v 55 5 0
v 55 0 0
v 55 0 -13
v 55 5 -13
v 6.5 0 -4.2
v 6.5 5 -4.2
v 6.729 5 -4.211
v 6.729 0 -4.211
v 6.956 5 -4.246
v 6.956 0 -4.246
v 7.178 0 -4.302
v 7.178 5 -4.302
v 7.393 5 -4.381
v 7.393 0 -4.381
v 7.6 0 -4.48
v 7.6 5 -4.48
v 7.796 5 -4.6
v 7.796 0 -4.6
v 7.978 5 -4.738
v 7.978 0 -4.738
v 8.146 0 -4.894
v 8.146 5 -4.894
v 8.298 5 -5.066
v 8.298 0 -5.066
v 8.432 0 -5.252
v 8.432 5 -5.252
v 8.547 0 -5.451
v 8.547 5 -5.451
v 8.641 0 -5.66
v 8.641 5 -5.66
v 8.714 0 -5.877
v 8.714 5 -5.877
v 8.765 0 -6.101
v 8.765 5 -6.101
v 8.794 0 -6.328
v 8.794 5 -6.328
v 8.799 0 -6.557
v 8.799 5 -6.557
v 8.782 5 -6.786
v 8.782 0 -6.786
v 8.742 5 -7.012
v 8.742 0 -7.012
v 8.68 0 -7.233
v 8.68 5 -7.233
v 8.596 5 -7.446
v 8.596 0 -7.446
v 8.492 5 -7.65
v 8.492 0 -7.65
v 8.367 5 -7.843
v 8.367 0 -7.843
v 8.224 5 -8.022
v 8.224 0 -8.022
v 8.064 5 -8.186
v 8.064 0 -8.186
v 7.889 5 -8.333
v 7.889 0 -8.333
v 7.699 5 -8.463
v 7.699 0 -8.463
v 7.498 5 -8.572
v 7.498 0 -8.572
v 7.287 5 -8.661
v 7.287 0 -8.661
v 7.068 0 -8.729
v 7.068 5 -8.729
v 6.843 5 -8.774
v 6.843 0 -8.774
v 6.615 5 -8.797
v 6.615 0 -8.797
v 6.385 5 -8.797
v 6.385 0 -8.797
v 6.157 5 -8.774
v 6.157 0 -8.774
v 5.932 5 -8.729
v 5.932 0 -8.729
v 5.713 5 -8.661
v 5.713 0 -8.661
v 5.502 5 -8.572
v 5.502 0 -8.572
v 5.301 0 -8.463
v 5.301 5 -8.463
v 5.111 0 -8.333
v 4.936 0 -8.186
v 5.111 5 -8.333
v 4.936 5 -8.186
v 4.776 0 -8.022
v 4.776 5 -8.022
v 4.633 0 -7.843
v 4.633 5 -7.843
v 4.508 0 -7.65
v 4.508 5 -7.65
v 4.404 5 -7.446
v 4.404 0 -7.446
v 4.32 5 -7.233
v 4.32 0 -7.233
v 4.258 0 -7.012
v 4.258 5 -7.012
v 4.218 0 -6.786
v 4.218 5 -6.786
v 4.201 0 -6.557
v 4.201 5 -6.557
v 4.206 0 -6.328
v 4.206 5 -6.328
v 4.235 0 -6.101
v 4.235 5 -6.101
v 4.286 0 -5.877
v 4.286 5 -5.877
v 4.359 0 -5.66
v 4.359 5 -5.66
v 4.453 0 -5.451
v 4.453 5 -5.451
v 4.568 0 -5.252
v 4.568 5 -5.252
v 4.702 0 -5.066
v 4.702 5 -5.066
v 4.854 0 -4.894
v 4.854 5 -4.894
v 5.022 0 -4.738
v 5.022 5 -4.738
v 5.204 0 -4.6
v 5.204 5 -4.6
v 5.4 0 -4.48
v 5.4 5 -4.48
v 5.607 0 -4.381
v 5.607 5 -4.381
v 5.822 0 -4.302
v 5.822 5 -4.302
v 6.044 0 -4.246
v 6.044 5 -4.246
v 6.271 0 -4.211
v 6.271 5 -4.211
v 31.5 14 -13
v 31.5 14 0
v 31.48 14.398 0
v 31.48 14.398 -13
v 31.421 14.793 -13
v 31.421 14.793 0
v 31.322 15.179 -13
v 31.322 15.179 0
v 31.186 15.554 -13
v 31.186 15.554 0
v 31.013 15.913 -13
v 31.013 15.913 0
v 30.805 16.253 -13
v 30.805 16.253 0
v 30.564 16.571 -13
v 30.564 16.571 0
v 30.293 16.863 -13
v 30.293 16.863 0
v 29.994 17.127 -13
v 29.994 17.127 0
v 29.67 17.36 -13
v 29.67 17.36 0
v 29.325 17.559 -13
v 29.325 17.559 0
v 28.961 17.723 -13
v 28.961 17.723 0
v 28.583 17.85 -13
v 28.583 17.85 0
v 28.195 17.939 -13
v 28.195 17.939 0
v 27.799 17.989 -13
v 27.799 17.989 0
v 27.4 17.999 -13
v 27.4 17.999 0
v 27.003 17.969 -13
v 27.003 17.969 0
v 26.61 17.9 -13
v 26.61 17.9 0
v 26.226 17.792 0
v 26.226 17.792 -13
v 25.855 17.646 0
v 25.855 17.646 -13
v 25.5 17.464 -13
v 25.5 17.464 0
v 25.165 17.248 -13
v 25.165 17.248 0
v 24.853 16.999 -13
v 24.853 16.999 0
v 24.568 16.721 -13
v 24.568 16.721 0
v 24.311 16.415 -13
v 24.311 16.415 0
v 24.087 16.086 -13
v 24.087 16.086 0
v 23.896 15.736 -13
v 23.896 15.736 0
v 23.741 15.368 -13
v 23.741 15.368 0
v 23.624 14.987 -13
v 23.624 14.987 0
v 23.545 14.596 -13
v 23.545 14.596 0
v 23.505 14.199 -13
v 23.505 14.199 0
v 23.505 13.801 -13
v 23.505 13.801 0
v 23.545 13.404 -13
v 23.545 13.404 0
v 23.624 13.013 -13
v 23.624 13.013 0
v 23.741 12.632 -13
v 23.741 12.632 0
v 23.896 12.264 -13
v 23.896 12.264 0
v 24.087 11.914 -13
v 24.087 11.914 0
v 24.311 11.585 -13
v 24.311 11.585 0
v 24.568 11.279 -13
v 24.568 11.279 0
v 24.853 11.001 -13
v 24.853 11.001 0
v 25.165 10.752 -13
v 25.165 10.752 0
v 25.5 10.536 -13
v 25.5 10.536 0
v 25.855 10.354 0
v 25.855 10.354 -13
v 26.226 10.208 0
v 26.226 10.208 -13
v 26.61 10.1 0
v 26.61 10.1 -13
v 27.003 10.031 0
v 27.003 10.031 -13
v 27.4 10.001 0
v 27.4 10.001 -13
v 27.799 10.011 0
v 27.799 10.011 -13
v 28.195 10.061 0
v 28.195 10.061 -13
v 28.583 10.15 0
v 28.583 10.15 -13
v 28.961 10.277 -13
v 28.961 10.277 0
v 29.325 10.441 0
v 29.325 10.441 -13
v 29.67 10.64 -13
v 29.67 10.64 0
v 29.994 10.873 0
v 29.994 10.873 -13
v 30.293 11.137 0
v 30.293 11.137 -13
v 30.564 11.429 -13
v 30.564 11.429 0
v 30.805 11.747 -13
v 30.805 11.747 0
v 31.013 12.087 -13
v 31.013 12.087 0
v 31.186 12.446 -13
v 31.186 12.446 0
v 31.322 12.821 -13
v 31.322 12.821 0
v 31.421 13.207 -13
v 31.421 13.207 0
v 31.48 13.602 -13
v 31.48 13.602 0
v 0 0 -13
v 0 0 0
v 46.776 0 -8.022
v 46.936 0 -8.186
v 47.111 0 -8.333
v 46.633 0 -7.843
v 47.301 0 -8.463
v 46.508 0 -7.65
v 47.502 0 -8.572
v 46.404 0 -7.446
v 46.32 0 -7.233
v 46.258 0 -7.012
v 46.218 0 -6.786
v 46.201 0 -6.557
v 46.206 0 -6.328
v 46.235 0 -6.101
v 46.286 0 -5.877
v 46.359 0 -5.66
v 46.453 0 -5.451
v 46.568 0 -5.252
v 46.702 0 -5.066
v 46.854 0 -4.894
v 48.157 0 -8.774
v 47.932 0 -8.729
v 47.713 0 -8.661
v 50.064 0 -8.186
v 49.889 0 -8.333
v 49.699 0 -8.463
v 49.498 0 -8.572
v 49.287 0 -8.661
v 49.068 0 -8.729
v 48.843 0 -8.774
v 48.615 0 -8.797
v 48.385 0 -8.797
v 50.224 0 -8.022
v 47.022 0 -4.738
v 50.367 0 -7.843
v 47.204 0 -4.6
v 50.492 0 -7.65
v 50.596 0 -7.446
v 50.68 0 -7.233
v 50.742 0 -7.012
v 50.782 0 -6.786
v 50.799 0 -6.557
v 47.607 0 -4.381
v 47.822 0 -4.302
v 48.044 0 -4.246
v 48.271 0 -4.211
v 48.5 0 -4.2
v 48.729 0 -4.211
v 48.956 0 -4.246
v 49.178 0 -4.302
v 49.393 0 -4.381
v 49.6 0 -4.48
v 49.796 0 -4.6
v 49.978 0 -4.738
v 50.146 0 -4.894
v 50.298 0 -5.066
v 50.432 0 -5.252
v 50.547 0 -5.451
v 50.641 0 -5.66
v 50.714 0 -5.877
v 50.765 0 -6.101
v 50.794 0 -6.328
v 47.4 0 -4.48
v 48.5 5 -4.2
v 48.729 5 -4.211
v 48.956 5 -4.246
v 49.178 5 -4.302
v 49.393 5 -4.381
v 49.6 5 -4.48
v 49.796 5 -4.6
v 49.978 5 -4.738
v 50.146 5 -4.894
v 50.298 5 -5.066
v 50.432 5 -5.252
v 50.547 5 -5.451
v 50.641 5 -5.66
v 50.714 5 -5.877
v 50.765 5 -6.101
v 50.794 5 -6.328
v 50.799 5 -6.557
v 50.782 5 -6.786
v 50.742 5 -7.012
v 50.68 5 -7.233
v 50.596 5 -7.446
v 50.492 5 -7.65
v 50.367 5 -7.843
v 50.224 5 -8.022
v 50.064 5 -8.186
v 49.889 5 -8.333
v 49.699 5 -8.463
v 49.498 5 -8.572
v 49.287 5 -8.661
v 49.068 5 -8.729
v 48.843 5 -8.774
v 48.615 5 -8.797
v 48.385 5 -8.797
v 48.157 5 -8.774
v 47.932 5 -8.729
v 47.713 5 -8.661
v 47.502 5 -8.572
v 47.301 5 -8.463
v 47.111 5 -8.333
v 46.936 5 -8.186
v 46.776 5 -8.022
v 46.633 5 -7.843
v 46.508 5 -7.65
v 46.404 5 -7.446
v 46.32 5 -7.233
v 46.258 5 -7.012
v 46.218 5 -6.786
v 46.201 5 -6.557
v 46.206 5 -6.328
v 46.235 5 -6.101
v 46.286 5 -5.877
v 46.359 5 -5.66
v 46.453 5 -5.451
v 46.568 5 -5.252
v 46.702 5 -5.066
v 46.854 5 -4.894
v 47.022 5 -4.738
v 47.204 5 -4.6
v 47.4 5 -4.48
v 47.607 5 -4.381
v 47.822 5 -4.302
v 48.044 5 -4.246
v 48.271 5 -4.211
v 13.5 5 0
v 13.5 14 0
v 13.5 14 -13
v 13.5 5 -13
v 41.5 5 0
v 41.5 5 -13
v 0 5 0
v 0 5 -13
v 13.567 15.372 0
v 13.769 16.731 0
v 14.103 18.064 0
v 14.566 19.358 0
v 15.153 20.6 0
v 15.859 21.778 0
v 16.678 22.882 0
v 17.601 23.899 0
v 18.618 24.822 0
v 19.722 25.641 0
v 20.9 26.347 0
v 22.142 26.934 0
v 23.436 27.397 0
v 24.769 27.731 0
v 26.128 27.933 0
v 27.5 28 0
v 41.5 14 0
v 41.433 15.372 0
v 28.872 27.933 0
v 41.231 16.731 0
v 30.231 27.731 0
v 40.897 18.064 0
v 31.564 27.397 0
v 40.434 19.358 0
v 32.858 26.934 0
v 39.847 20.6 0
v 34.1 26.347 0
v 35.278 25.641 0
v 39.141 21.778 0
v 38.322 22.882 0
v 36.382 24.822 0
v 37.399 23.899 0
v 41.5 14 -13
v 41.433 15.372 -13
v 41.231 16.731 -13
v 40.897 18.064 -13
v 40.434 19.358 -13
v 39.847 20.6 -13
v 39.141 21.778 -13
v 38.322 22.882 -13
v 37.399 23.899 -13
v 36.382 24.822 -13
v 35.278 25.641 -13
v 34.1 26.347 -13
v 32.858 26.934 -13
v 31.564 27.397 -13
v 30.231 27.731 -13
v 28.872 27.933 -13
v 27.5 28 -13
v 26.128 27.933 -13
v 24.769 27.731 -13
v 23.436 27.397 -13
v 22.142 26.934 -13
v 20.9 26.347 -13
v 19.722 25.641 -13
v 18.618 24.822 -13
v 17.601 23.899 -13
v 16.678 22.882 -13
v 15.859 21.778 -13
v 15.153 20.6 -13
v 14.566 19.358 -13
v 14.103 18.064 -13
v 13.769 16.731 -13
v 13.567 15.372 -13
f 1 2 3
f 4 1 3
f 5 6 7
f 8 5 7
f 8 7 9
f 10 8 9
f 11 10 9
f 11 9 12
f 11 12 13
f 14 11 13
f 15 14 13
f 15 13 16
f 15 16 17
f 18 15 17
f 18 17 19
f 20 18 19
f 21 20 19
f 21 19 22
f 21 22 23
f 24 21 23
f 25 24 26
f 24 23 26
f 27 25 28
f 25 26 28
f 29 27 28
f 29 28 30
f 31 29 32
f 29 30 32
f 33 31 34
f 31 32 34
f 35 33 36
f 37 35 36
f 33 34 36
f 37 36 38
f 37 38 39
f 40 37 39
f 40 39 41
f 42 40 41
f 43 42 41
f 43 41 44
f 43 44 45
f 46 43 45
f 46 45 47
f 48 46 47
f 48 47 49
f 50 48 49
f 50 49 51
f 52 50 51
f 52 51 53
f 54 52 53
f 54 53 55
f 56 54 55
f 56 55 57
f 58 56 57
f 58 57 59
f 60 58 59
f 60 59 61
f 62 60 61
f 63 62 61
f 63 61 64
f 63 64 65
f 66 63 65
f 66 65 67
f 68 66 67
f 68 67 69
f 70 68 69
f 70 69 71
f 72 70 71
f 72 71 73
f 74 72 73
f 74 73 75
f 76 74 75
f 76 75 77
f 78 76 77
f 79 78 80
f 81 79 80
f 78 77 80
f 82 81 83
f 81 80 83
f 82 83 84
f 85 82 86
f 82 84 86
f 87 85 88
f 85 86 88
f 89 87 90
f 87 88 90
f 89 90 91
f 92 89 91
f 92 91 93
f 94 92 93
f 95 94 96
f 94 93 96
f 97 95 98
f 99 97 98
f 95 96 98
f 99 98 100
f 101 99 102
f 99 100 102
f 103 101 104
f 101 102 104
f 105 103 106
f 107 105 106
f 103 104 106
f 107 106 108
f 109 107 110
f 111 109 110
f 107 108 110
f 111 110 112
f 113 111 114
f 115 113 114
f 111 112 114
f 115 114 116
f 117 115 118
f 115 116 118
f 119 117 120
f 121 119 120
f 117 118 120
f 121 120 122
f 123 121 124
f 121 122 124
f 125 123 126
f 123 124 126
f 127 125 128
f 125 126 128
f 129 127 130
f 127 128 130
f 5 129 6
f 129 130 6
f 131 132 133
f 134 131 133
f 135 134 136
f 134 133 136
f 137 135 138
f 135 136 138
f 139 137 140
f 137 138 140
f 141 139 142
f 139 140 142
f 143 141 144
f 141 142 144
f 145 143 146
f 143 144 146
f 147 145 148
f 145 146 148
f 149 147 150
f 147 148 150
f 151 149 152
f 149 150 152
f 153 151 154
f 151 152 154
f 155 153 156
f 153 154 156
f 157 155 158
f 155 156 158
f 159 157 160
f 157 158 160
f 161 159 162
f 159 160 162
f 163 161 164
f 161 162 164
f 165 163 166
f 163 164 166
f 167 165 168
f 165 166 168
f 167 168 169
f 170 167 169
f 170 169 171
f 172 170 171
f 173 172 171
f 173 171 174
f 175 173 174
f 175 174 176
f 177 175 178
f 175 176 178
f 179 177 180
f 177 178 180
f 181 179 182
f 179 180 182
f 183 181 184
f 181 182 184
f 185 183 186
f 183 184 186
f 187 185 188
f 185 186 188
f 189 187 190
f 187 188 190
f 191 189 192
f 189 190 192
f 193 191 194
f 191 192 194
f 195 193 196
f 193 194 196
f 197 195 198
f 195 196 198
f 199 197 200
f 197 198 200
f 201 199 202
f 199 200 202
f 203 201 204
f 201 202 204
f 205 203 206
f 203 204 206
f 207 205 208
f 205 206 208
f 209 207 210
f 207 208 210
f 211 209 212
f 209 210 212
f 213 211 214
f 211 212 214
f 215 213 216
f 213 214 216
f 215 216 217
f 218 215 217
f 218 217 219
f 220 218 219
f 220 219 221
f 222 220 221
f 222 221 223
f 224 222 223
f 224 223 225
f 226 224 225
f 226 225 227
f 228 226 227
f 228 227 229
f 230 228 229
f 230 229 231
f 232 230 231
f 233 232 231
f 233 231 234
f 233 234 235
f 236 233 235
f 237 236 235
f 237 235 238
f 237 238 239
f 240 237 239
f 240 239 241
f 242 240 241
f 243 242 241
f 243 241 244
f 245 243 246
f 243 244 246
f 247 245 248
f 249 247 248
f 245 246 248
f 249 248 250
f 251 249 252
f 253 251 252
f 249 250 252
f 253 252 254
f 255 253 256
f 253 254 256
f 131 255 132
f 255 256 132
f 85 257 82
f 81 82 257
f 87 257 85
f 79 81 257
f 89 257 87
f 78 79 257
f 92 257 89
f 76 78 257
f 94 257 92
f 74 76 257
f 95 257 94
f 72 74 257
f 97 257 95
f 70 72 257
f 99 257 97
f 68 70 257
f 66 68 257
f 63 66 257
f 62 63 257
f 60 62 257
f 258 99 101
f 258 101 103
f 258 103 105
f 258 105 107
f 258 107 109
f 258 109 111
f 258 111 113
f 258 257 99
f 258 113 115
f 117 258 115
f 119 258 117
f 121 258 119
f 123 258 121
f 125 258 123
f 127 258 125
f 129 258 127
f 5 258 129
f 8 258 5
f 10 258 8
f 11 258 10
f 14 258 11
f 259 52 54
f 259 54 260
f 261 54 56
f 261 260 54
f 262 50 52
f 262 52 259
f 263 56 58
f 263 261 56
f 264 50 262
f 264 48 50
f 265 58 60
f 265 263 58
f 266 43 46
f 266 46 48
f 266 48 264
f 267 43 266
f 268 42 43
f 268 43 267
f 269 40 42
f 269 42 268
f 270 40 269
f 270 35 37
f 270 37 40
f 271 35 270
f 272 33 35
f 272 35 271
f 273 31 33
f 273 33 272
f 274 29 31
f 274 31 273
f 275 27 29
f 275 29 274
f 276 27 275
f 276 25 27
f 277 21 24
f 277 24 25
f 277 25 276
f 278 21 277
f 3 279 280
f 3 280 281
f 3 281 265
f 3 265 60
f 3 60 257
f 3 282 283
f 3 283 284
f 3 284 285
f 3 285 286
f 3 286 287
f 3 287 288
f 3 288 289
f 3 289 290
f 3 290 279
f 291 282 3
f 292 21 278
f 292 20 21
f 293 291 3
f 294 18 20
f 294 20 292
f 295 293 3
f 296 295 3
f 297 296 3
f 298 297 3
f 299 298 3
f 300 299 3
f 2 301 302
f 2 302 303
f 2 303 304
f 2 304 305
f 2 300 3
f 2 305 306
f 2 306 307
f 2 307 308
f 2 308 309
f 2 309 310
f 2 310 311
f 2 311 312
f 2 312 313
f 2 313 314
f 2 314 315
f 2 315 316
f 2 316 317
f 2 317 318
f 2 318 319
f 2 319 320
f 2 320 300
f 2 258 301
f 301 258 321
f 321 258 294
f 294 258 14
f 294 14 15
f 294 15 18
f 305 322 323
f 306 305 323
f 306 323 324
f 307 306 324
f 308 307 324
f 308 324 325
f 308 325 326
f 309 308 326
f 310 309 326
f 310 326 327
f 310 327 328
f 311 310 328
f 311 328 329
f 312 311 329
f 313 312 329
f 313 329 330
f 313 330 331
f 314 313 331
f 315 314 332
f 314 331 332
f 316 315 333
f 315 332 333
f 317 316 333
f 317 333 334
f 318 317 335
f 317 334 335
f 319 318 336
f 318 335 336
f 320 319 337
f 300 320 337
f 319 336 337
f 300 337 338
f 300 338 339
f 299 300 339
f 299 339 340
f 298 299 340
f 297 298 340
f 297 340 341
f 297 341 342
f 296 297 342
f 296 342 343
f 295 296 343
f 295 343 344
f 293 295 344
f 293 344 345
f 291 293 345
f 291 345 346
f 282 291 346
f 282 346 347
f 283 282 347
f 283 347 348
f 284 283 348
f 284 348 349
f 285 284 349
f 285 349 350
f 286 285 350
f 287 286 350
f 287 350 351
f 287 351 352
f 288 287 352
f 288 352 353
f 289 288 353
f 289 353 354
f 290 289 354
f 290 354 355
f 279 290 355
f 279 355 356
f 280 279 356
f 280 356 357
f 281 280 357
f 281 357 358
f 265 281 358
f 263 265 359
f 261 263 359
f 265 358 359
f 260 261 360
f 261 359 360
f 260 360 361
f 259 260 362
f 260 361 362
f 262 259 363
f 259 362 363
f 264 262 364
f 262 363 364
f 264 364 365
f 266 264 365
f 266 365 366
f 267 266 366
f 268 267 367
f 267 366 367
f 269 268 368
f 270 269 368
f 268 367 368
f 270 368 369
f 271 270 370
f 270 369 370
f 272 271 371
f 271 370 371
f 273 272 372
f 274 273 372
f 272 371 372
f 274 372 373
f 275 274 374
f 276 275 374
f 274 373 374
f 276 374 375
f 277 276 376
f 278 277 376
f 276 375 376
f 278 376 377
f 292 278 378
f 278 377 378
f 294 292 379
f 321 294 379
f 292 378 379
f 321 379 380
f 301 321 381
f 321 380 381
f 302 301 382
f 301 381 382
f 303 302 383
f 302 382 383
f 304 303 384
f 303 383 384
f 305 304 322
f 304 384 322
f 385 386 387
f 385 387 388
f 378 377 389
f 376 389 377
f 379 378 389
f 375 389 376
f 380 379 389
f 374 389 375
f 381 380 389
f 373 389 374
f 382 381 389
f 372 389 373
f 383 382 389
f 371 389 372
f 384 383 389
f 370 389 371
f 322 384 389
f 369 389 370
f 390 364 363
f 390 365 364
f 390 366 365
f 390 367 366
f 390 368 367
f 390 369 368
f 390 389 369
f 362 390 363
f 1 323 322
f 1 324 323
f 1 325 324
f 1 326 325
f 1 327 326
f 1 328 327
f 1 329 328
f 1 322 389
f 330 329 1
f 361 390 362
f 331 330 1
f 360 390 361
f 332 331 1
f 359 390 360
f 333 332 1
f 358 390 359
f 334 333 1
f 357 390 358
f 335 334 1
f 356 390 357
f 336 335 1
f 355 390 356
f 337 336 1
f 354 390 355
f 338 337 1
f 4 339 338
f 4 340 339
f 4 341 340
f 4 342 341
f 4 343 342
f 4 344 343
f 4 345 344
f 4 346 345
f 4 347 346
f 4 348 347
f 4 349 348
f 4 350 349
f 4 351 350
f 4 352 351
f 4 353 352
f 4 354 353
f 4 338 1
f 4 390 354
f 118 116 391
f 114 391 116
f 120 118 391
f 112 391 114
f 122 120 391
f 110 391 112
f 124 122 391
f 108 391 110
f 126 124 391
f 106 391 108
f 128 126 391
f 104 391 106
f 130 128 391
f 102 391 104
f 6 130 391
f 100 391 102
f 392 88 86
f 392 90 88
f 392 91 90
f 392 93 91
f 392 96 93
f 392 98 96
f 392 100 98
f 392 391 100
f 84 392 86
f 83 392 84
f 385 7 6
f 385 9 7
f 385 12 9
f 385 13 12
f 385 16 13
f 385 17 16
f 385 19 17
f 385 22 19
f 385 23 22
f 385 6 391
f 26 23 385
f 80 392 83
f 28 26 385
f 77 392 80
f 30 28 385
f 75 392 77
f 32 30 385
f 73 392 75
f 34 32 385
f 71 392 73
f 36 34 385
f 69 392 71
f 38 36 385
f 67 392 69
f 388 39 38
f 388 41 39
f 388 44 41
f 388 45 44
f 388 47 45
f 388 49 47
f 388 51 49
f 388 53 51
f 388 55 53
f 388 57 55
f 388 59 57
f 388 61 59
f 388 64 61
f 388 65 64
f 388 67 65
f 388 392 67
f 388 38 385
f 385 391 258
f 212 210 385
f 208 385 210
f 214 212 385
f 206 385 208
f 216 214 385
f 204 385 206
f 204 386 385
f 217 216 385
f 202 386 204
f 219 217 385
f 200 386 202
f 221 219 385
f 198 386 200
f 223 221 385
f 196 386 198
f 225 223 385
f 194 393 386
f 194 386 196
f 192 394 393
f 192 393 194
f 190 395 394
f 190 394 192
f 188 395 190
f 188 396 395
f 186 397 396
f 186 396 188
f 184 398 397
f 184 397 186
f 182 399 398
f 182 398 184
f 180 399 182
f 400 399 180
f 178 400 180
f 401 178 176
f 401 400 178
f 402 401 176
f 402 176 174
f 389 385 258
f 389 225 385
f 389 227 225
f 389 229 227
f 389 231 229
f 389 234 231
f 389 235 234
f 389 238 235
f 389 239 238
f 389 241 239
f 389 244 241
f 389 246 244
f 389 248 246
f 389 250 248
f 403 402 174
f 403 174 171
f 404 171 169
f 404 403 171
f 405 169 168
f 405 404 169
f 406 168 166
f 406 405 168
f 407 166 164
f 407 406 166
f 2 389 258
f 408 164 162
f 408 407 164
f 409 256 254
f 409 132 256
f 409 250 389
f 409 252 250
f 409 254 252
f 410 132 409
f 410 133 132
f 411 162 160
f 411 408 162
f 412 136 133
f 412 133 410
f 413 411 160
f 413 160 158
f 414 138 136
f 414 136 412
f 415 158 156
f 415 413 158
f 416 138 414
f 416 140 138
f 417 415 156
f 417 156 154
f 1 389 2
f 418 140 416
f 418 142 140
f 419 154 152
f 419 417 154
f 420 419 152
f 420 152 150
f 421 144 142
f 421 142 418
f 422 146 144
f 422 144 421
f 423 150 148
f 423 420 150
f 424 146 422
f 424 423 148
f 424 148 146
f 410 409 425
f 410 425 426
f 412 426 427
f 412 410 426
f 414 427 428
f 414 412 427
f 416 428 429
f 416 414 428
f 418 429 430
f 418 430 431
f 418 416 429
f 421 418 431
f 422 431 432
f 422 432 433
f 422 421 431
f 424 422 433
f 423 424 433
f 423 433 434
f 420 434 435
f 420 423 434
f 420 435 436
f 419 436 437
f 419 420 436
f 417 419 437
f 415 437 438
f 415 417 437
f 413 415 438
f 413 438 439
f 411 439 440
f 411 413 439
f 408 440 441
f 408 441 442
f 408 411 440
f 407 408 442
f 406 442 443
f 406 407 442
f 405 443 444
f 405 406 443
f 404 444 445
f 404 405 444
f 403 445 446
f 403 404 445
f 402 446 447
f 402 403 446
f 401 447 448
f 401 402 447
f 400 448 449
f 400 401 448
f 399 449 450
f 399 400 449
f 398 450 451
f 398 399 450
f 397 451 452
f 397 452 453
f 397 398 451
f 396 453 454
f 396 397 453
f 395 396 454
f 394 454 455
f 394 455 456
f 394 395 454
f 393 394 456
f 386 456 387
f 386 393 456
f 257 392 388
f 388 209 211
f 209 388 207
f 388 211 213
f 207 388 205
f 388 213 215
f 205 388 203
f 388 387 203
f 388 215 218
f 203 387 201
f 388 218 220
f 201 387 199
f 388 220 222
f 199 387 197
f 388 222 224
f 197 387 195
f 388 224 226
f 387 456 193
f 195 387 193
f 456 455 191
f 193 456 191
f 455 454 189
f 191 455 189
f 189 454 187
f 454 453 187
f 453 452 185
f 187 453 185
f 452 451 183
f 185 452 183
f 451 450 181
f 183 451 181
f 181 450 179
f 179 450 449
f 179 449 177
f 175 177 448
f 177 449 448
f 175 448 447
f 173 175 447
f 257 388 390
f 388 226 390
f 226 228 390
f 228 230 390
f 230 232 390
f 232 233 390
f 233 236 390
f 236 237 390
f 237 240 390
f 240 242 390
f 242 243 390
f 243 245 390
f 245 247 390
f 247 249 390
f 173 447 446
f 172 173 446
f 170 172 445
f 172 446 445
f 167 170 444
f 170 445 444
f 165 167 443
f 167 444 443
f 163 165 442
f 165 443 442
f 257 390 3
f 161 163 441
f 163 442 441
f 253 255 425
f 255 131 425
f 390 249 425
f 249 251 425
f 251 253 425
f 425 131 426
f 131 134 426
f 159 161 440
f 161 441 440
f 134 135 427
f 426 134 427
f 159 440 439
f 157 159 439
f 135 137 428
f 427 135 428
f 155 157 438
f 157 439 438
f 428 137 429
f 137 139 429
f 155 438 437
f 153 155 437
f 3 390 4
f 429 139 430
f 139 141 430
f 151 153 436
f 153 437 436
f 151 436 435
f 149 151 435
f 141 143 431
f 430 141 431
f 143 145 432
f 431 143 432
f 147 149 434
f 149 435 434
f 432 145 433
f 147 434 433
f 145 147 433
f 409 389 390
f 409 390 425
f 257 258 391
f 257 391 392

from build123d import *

# Parameters (mm, degrees)
SKETCH1_W           = 55
SKETCH1_H           = 13
BOSS_EXTRUDE1_DEPTH = 5
SKETCH2_R           = 4
BOSS_EXTRUDE2_DEPTH = 13
CUT_EXTRUDE1_REACH  = 63.016
SKETCH3_R           = 2.3


with BuildPart() as part:
    # Sketch1 → Boss-Extrude1 (new body)
    with BuildSketch(Plane(origin=(0, 0, 0), x_dir=(1, 0, 0), z_dir=(0, 1, 0))):
        with Locations((27.5, 6.5)):
            Rectangle(SKETCH1_W, SKETCH1_H)
    extrude(amount=BOSS_EXTRUDE1_DEPTH)

    # Sketch2 → Boss-Extrude2 (add)
    with BuildSketch(Plane.XY):
        with BuildLine():
            Line((13.5, 14), (13.5, 0))
            Line((13.5, 0), (41.5, 0))
            Line((41.5, 0), (41.5, 14))
            ThreePointArc((41.5, 14), (27.5, 28), (13.5, 14))
        make_face()
        with Locations((27.5, 14)):
            Circle(SKETCH2_R, mode=Mode.SUBTRACT)
    extrude(amount=-BOSS_EXTRUDE2_DEPTH)

    # Sketch3 → Cut-Extrude1 (cut, up to next)
    with BuildSketch(Plane(origin=(0, 5, 0), x_dir=(1, 0, 0), z_dir=(0, 1, 0)), mode=Mode.PRIVATE) as cut_extrude1_sk1:
        with Locations(Location((48.5, 6.5, 0), (0, 0, 270))):
            Circle(SKETCH3_R)
    cut_extrude1_tool1 = extrude(cut_extrude1_sk1.sketch, amount=-CUT_EXTRUDE1_REACH, mode=Mode.PRIVATE) & part.part
    # Sketch3 → Cut-Extrude1 (cut, up to next)
    with BuildSketch(Plane(origin=(0, 5, 0), x_dir=(1, 0, 0), z_dir=(0, 1, 0)), mode=Mode.PRIVATE) as cut_extrude1_sk2:
        with Locations(Location((6.5, 6.5, 0), (0, 0, 270))):
            Circle(SKETCH3_R)
    cut_extrude1_tool2 = extrude(cut_extrude1_sk2.sketch, amount=-CUT_EXTRUDE1_REACH, mode=Mode.PRIVATE) & part.part
    add(cut_extrude1_tool1.solids().sort_by_distance((48.5, 5, -6.5))[0], mode=Mode.SUBTRACT)
    add(cut_extrude1_tool2.solids().sort_by_distance((6.5, 5, -6.5))[0], mode=Mode.SUBTRACT)


solid = part.part
